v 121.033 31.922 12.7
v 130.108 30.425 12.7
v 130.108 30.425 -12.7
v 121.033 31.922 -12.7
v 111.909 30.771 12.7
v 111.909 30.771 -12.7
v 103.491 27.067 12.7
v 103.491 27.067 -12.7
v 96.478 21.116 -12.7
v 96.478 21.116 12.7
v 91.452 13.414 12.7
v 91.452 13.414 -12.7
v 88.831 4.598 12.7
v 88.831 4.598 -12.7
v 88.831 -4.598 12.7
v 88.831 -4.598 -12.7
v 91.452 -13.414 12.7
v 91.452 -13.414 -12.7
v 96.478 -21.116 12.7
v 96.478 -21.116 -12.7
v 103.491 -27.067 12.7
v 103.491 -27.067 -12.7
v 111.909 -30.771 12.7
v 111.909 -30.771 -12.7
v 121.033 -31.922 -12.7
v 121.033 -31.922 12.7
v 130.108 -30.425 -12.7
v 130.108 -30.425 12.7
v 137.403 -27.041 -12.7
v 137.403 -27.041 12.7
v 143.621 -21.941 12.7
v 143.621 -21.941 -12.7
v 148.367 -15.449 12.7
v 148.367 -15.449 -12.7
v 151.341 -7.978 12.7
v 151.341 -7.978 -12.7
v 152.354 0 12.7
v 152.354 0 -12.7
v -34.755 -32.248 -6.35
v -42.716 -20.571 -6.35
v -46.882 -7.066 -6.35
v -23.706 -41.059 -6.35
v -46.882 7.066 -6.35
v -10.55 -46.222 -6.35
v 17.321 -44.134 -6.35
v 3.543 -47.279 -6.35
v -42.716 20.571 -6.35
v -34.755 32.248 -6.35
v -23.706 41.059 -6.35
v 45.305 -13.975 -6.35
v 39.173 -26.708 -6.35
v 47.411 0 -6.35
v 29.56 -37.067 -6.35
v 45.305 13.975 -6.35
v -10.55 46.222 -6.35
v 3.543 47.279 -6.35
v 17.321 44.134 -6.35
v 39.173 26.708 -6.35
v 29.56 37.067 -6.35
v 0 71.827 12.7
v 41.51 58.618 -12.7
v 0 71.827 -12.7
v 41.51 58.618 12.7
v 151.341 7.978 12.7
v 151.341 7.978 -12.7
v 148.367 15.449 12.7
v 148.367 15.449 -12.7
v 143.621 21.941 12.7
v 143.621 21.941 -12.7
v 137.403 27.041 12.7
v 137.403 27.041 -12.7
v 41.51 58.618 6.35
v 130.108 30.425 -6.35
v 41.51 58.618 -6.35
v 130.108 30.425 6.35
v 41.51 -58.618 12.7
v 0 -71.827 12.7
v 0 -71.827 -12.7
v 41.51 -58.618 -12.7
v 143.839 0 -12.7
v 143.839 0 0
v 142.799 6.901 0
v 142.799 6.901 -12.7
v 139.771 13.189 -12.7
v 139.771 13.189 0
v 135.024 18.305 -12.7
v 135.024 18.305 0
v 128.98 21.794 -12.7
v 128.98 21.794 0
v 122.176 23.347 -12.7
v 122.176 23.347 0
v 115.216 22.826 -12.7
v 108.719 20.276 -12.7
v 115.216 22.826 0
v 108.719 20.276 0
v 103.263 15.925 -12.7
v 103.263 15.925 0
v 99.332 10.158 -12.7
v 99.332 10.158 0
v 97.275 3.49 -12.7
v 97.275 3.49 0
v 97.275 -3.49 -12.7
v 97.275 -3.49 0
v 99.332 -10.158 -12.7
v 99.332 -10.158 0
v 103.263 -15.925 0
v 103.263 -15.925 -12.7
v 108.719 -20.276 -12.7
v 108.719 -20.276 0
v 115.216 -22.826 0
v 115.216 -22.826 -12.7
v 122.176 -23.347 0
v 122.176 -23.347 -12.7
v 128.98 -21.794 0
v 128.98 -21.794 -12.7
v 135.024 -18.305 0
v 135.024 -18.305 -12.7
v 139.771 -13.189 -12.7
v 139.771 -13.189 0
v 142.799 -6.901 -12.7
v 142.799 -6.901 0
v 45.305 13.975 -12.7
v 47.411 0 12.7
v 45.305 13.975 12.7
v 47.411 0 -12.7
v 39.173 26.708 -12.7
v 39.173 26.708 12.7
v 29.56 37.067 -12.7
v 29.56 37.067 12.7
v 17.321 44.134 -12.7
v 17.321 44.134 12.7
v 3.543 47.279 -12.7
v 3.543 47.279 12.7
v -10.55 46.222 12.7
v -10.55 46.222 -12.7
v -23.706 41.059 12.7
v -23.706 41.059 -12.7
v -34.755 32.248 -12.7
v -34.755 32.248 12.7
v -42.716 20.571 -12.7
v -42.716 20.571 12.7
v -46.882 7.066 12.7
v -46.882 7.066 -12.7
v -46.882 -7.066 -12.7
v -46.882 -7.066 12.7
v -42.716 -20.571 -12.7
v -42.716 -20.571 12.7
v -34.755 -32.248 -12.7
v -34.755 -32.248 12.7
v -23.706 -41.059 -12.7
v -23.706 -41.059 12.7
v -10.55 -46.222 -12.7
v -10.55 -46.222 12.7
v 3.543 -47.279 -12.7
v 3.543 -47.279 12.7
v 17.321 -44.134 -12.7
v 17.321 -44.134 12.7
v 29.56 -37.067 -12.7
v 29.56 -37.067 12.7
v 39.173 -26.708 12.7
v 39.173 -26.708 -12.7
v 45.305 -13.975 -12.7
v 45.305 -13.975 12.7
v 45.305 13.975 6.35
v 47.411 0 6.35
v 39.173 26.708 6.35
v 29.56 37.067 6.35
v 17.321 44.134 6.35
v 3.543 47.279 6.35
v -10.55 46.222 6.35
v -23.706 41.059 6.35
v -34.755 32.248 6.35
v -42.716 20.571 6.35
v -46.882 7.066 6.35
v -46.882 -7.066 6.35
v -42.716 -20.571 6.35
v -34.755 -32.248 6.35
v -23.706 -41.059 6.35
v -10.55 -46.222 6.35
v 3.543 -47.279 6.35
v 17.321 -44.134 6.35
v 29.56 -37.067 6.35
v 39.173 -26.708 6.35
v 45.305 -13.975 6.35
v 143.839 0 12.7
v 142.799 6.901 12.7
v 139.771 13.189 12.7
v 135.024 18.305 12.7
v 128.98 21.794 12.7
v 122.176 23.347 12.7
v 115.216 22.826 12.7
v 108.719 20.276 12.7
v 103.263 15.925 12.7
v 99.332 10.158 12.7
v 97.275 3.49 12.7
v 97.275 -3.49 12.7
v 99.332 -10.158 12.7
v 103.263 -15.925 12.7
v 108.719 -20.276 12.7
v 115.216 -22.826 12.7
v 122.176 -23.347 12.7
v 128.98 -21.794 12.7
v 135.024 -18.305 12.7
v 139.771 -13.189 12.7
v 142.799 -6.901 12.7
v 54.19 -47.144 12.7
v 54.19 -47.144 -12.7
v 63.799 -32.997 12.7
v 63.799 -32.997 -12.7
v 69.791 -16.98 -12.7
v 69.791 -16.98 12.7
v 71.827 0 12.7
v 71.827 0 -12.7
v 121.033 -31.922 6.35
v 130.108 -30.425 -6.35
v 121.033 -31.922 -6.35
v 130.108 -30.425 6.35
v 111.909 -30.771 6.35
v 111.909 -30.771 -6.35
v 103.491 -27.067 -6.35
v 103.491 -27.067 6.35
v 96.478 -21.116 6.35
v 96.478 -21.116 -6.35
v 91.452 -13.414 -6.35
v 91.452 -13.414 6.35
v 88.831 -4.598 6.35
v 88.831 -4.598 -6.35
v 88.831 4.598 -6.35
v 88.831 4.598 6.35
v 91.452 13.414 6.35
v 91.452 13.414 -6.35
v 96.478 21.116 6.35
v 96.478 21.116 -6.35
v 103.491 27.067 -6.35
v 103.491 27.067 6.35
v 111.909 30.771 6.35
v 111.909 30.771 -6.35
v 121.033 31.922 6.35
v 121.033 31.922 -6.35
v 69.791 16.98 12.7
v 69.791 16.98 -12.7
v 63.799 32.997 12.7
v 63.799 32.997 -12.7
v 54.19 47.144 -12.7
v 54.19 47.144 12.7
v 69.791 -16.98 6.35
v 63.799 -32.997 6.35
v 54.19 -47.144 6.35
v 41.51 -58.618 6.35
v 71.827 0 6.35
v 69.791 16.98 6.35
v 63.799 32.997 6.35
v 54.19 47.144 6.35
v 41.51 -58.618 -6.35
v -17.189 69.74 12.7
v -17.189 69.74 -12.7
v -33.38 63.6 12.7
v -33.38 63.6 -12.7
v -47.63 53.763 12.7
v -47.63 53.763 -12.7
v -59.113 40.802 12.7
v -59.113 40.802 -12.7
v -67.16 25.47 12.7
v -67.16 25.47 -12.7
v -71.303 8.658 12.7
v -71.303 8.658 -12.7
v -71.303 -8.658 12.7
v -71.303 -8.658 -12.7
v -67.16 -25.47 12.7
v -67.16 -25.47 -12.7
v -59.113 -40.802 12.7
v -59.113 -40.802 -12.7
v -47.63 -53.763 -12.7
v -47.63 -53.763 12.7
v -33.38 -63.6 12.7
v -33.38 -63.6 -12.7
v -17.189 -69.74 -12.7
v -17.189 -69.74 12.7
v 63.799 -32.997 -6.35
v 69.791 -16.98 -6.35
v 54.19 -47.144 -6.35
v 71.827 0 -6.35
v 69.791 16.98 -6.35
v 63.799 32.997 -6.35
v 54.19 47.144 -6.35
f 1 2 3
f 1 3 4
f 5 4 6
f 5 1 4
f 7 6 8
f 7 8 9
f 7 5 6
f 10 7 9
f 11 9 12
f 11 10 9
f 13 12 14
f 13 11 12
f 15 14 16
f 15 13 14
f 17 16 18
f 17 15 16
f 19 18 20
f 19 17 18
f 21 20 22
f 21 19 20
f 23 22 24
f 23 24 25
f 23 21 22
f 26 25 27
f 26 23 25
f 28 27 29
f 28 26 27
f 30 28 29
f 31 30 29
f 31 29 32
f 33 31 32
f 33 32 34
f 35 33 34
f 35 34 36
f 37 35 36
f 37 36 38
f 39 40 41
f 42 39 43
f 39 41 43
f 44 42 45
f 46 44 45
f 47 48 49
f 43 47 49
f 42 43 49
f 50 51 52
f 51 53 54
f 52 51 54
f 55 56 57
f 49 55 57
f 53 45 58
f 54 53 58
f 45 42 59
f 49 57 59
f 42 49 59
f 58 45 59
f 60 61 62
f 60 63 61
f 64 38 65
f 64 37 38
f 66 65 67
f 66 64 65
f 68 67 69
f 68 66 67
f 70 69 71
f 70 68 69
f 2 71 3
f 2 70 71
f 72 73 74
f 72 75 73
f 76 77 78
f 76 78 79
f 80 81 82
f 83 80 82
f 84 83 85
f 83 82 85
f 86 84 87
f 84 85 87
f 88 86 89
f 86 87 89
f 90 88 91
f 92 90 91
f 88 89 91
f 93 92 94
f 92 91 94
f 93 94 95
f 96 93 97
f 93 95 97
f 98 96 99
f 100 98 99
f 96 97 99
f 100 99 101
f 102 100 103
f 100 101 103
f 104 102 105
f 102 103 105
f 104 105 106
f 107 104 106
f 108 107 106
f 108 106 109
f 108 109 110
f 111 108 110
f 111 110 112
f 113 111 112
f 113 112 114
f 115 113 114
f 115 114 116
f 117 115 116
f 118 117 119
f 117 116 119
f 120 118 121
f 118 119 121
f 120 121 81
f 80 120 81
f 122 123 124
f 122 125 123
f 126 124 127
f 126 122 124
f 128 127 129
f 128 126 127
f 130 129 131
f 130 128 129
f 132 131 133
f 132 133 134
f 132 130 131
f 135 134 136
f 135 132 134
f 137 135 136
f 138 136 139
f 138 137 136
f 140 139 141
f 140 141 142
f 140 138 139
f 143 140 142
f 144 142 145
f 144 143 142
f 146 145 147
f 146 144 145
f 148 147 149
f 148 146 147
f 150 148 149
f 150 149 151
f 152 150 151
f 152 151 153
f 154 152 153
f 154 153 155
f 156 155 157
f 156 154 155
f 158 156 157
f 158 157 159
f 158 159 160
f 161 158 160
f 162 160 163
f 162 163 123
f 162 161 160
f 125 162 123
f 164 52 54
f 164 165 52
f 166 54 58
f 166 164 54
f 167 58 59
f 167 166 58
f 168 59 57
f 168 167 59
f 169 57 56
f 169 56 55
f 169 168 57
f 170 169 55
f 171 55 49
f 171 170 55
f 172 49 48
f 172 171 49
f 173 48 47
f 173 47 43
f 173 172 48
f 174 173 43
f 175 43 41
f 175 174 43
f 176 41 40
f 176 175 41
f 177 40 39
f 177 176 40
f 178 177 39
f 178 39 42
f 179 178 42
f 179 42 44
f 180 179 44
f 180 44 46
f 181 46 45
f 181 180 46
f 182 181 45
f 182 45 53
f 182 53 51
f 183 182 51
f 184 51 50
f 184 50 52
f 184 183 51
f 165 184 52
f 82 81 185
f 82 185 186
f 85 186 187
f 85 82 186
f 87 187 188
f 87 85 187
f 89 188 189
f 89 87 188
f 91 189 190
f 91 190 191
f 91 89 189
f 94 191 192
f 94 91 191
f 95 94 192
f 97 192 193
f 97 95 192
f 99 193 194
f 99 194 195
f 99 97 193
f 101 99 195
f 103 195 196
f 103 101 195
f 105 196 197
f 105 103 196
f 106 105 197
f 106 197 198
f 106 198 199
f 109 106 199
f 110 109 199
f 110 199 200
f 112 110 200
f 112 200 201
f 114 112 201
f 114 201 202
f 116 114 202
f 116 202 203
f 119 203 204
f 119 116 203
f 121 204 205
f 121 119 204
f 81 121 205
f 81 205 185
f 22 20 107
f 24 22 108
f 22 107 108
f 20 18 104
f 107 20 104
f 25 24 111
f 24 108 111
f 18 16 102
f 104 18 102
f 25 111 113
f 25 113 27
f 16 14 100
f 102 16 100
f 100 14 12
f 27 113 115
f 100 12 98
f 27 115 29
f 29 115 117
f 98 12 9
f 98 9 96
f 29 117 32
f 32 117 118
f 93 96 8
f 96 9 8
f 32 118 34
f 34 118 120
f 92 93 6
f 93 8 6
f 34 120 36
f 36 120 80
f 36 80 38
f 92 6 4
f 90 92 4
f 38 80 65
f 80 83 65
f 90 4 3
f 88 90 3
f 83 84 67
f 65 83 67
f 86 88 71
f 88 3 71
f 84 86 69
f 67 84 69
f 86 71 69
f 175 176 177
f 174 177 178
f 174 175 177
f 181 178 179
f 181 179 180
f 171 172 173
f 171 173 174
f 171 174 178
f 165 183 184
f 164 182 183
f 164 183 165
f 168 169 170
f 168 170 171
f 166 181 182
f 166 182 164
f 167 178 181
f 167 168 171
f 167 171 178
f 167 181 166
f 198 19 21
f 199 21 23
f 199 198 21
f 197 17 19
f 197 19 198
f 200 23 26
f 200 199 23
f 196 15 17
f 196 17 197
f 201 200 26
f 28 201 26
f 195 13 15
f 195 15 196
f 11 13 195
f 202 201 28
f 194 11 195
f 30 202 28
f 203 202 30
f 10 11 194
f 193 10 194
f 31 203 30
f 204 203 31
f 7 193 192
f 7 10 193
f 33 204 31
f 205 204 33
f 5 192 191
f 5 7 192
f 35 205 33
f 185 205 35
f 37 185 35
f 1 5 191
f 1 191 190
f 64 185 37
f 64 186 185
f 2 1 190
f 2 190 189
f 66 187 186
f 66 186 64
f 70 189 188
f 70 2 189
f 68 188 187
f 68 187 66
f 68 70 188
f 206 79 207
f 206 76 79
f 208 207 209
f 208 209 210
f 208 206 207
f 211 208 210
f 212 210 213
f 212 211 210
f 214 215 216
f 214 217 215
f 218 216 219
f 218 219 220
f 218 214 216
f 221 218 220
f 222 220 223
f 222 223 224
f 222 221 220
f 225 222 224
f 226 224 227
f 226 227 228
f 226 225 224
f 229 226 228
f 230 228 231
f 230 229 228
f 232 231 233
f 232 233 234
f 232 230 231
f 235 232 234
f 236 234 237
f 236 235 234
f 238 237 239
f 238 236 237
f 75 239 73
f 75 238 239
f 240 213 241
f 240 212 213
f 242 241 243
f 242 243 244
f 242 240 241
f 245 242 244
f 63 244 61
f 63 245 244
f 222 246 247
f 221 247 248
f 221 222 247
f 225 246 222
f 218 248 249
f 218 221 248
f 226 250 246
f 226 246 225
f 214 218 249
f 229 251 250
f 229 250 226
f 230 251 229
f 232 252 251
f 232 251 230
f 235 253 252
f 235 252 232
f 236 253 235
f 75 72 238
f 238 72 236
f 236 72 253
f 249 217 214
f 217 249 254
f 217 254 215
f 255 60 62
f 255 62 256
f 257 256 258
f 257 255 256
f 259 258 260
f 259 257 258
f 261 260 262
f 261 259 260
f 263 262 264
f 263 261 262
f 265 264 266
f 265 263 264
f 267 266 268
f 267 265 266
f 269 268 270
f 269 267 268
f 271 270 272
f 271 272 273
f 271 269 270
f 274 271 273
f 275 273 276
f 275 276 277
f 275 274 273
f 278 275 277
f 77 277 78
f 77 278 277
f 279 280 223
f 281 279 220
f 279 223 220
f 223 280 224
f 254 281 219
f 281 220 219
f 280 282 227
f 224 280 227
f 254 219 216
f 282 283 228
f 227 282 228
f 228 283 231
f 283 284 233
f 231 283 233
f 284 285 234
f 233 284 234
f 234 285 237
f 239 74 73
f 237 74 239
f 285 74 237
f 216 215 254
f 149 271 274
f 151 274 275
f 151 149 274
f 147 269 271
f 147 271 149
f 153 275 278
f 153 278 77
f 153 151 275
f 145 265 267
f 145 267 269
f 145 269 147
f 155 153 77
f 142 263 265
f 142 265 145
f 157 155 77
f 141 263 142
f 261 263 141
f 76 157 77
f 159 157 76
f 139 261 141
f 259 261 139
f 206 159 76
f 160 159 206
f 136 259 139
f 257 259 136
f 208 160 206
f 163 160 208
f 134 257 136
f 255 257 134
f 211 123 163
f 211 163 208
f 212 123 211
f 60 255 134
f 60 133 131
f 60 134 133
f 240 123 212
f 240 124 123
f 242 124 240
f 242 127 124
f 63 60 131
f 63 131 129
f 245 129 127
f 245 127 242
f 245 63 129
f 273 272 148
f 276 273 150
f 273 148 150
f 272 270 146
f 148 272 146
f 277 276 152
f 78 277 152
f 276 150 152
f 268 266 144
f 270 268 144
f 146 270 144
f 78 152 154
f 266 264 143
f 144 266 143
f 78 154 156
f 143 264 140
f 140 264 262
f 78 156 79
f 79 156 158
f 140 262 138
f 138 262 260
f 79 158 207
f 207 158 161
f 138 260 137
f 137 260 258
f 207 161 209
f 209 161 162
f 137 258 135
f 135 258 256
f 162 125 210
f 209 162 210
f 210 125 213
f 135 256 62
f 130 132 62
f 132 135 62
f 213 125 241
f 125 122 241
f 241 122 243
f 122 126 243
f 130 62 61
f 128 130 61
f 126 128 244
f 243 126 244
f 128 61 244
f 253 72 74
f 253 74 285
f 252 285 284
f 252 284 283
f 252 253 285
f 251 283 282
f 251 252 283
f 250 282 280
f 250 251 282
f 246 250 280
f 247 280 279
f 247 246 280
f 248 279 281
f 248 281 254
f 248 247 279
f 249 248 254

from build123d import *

# Parameters (mm, degrees)
F0_R     = 47.411095877
F1_DEPTH = 12.7
F0_R_2   = 23.4128804589
F2_DEPTH = 6.35


with BuildPart() as f1:
    # F0 (on Top) → F1 (new body, symmetric)
    with BuildSketch(Plane.XY):
        with BuildLine():
            Line((41.5098547303, 58.6180414786), (0, 71.8271733157))
            ThreePointArc((0, 71.8271733157), (-71.8271733157, 0), (0, -71.8271733157))
            Line((0, -71.8271733157), (41.5098547303, -58.6180414786))
            ThreePointArc((41.5098547303, -58.6180414786), (63.7992098562, -32.9970248394), (71.8271733157, 0))
            ThreePointArc((71.8271733157, 0), (63.7992098562, 32.9970248394), (41.5098547303, 58.6180414786))
        make_face()
        Circle(F0_R, mode=Mode.SUBTRACT)
    extrude(amount=F1_DEPTH, both=True)


with BuildPart() as f1b:
    # F0 (on Top) → F1, piece 2 (new body, symmetric)
    with BuildSketch(Plane.XY):
        with BuildLine():
            ThreePointArc((152.353980984, 0), (146.1991452891, 18.845205951), (130.1075988936, 30.4247536263))
            ThreePointArc((130.1075988936, 30.4247536263), (88.4978832347, 0), (130.1075988936, -30.4247536263))
            ThreePointArc((130.1075988936, -30.4247536263), (146.1991452891, -18.845205951), (152.353980984, 0))
        make_face()
        with Locations((120.4259321094, 0)):
            Circle(F0_R_2, mode=Mode.SUBTRACT)
    extrude(amount=F1_DEPTH, both=True)


with BuildPart() as f2:
    # F0 (on Top) → F2 (new body, symmetric)
    with BuildSketch(Plane.XY):
        with BuildLine():
            Line((130.1075988936, 30.4247536263), (41.5098547303, 58.6180414786))
            ThreePointArc((41.5098547303, 58.6180414786), (63.7992098562, 32.9970248394), (71.8271733157, 0))
            ThreePointArc((71.8271733157, 0), (63.7992098562, -32.9970248394), (41.5098547303, -58.6180414786))
            Line((41.5098547303, -58.6180414786), (130.1075988936, -30.4247536263))
            ThreePointArc((130.1075988936, -30.4247536263), (88.4978832347, 0), (130.1075988936, 30.4247536263))
        make_face()
    extrude(amount=F2_DEPTH, both=True)


with BuildPart() as f2b:
    # F0 (on Top) → F2, piece 2 (new body, symmetric)
    with BuildSketch(Plane.XY):
        Circle(F0_R)
    extrude(amount=F2_DEPTH, both=True)


solid = Compound([f1.part, f1b.part, f2.part, f2b.part])
